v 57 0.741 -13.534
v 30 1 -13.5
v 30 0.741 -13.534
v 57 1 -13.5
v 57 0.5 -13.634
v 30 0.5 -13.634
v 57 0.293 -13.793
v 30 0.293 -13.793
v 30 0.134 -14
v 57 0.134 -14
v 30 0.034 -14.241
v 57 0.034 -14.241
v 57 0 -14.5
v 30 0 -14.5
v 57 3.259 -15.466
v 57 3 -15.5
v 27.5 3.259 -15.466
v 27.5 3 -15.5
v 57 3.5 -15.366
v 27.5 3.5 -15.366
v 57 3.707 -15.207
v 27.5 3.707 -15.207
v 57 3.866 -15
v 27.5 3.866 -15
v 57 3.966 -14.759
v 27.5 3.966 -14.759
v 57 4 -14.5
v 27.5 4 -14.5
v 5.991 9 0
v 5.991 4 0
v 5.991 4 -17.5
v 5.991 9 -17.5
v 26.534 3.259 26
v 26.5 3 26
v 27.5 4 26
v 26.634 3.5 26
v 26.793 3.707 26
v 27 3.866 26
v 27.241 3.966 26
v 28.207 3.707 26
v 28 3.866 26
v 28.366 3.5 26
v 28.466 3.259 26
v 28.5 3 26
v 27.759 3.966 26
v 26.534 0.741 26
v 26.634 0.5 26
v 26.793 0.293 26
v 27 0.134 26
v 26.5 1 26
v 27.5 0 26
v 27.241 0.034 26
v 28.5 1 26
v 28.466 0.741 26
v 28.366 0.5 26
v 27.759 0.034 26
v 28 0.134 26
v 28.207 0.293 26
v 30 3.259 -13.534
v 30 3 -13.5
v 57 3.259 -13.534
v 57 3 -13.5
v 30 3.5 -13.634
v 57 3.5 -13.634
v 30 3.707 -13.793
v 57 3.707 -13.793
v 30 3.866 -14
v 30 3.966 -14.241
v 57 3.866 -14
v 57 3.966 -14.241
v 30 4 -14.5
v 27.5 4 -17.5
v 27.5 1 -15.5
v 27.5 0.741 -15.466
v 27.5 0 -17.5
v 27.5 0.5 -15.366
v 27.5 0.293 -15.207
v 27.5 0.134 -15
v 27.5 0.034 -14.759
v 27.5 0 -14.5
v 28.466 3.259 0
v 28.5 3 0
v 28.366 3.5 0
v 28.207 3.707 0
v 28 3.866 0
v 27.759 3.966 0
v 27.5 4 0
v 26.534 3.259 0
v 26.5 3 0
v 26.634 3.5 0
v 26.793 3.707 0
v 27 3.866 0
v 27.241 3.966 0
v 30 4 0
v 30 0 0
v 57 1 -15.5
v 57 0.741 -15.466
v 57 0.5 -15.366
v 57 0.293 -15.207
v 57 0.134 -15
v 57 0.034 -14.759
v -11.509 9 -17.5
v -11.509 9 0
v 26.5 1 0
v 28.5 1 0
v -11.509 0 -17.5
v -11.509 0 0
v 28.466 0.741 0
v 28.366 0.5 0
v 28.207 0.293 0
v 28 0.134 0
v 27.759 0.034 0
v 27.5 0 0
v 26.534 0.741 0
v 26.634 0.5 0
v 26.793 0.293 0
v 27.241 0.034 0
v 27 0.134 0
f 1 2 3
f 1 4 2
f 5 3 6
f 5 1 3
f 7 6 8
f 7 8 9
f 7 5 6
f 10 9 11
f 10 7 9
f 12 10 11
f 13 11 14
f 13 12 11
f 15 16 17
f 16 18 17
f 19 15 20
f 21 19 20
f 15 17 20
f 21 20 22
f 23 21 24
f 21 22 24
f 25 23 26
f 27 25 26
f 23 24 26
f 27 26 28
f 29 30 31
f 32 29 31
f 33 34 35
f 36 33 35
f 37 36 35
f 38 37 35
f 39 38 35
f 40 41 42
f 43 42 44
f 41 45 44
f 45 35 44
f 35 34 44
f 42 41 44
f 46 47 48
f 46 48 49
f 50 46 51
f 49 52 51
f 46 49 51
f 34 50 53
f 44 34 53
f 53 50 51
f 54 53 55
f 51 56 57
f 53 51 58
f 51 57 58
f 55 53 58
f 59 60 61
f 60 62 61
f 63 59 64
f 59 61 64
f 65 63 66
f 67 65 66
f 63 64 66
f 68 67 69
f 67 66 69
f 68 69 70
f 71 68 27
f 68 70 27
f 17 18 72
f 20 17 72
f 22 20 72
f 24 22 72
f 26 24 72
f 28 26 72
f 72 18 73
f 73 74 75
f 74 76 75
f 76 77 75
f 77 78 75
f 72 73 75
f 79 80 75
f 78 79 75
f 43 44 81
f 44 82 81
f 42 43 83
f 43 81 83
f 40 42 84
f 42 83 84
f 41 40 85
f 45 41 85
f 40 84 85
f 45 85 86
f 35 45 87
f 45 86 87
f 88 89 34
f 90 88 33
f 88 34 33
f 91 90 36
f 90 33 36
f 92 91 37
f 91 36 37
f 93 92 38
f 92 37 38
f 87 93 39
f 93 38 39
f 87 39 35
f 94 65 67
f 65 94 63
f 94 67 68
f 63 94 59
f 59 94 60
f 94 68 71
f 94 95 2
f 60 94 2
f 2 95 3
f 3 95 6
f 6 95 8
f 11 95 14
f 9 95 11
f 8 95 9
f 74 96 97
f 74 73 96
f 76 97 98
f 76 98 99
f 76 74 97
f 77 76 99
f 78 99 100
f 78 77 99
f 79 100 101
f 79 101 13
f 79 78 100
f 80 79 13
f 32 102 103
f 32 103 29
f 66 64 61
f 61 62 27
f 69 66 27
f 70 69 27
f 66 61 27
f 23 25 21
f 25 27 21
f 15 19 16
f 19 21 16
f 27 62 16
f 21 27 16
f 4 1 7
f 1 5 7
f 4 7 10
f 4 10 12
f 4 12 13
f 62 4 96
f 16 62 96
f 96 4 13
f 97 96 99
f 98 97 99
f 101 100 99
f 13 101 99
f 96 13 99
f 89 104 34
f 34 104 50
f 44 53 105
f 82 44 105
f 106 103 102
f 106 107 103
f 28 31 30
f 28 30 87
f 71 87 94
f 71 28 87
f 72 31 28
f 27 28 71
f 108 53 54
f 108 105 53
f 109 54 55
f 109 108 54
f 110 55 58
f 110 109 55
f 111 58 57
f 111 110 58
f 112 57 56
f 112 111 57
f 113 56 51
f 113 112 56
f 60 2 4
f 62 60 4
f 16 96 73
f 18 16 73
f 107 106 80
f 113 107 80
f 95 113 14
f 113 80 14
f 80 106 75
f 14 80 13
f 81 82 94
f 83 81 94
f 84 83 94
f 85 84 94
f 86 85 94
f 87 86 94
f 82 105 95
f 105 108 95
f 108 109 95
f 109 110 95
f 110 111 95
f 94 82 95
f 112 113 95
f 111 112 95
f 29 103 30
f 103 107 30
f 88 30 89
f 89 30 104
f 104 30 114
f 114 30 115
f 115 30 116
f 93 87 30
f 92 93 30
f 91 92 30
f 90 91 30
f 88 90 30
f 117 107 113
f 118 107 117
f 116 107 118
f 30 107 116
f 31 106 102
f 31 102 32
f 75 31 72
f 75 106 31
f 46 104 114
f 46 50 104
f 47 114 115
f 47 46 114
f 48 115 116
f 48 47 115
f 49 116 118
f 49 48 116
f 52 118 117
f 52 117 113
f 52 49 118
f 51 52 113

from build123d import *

# Parameters (mm, degrees)
BOSS_EXTRUDE1_DEPTH = 4
FILLET1_R           = 1
SKETCH4_W           = 17.5
SKETCH4_H           = 17.5
BOSS_EXTRUDE3_DEPTH = 5


with BuildPart() as part:
    # Sketch2 → Boss-Extrude1 (new body)
    with BuildSketch(Plane(origin=(0, 0, 0), x_dir=(1, 0, 0), z_dir=(0, 1, 0))):
        Polygon((0, 0), (26.5, 0), (26.5, -26), (28.5, -26), (28.5, 0), (30, 0), (30, 13.5), (57, 13.5), (57, 15.5), (29, 15.5), (27.5, 15.5), (27.5, 17.5), (2.991015417, 17.5), (-11.508984583, 17.5), (-11.508984583, 0), align=None)
    extrude(amount=BOSS_EXTRUDE1_DEPTH)

    # Fillet1
    fillet1_edges = [part.edges().sort_by_distance(p)[0] for p in [
        (42.25, 0, -15.5),
        (28.5, 0, 13),
        (26.5, 0, 13),
        (43.5, 0, -13.5),
        (42.25, 4, -15.5),
        (43.5, 4, -13.5),
        (28.5, 4, 13),
        (26.5, 4, 13),
    ]]
    fillet(fillet1_edges, radius=FILLET1_R - 0.0001)  # a hair under: the kernel refuses the full size

    # Sketch4 → Boss-Extrude3 (add)
    with BuildSketch(Plane(origin=(0, 4, 0), x_dir=(1, 0, 0), z_dir=(0, 1, 0))):
        with Locations((-2.758984583, 8.75)):
            Rectangle(SKETCH4_W, SKETCH4_H)
    extrude(amount=BOSS_EXTRUDE3_DEPTH)


solid = part.part
